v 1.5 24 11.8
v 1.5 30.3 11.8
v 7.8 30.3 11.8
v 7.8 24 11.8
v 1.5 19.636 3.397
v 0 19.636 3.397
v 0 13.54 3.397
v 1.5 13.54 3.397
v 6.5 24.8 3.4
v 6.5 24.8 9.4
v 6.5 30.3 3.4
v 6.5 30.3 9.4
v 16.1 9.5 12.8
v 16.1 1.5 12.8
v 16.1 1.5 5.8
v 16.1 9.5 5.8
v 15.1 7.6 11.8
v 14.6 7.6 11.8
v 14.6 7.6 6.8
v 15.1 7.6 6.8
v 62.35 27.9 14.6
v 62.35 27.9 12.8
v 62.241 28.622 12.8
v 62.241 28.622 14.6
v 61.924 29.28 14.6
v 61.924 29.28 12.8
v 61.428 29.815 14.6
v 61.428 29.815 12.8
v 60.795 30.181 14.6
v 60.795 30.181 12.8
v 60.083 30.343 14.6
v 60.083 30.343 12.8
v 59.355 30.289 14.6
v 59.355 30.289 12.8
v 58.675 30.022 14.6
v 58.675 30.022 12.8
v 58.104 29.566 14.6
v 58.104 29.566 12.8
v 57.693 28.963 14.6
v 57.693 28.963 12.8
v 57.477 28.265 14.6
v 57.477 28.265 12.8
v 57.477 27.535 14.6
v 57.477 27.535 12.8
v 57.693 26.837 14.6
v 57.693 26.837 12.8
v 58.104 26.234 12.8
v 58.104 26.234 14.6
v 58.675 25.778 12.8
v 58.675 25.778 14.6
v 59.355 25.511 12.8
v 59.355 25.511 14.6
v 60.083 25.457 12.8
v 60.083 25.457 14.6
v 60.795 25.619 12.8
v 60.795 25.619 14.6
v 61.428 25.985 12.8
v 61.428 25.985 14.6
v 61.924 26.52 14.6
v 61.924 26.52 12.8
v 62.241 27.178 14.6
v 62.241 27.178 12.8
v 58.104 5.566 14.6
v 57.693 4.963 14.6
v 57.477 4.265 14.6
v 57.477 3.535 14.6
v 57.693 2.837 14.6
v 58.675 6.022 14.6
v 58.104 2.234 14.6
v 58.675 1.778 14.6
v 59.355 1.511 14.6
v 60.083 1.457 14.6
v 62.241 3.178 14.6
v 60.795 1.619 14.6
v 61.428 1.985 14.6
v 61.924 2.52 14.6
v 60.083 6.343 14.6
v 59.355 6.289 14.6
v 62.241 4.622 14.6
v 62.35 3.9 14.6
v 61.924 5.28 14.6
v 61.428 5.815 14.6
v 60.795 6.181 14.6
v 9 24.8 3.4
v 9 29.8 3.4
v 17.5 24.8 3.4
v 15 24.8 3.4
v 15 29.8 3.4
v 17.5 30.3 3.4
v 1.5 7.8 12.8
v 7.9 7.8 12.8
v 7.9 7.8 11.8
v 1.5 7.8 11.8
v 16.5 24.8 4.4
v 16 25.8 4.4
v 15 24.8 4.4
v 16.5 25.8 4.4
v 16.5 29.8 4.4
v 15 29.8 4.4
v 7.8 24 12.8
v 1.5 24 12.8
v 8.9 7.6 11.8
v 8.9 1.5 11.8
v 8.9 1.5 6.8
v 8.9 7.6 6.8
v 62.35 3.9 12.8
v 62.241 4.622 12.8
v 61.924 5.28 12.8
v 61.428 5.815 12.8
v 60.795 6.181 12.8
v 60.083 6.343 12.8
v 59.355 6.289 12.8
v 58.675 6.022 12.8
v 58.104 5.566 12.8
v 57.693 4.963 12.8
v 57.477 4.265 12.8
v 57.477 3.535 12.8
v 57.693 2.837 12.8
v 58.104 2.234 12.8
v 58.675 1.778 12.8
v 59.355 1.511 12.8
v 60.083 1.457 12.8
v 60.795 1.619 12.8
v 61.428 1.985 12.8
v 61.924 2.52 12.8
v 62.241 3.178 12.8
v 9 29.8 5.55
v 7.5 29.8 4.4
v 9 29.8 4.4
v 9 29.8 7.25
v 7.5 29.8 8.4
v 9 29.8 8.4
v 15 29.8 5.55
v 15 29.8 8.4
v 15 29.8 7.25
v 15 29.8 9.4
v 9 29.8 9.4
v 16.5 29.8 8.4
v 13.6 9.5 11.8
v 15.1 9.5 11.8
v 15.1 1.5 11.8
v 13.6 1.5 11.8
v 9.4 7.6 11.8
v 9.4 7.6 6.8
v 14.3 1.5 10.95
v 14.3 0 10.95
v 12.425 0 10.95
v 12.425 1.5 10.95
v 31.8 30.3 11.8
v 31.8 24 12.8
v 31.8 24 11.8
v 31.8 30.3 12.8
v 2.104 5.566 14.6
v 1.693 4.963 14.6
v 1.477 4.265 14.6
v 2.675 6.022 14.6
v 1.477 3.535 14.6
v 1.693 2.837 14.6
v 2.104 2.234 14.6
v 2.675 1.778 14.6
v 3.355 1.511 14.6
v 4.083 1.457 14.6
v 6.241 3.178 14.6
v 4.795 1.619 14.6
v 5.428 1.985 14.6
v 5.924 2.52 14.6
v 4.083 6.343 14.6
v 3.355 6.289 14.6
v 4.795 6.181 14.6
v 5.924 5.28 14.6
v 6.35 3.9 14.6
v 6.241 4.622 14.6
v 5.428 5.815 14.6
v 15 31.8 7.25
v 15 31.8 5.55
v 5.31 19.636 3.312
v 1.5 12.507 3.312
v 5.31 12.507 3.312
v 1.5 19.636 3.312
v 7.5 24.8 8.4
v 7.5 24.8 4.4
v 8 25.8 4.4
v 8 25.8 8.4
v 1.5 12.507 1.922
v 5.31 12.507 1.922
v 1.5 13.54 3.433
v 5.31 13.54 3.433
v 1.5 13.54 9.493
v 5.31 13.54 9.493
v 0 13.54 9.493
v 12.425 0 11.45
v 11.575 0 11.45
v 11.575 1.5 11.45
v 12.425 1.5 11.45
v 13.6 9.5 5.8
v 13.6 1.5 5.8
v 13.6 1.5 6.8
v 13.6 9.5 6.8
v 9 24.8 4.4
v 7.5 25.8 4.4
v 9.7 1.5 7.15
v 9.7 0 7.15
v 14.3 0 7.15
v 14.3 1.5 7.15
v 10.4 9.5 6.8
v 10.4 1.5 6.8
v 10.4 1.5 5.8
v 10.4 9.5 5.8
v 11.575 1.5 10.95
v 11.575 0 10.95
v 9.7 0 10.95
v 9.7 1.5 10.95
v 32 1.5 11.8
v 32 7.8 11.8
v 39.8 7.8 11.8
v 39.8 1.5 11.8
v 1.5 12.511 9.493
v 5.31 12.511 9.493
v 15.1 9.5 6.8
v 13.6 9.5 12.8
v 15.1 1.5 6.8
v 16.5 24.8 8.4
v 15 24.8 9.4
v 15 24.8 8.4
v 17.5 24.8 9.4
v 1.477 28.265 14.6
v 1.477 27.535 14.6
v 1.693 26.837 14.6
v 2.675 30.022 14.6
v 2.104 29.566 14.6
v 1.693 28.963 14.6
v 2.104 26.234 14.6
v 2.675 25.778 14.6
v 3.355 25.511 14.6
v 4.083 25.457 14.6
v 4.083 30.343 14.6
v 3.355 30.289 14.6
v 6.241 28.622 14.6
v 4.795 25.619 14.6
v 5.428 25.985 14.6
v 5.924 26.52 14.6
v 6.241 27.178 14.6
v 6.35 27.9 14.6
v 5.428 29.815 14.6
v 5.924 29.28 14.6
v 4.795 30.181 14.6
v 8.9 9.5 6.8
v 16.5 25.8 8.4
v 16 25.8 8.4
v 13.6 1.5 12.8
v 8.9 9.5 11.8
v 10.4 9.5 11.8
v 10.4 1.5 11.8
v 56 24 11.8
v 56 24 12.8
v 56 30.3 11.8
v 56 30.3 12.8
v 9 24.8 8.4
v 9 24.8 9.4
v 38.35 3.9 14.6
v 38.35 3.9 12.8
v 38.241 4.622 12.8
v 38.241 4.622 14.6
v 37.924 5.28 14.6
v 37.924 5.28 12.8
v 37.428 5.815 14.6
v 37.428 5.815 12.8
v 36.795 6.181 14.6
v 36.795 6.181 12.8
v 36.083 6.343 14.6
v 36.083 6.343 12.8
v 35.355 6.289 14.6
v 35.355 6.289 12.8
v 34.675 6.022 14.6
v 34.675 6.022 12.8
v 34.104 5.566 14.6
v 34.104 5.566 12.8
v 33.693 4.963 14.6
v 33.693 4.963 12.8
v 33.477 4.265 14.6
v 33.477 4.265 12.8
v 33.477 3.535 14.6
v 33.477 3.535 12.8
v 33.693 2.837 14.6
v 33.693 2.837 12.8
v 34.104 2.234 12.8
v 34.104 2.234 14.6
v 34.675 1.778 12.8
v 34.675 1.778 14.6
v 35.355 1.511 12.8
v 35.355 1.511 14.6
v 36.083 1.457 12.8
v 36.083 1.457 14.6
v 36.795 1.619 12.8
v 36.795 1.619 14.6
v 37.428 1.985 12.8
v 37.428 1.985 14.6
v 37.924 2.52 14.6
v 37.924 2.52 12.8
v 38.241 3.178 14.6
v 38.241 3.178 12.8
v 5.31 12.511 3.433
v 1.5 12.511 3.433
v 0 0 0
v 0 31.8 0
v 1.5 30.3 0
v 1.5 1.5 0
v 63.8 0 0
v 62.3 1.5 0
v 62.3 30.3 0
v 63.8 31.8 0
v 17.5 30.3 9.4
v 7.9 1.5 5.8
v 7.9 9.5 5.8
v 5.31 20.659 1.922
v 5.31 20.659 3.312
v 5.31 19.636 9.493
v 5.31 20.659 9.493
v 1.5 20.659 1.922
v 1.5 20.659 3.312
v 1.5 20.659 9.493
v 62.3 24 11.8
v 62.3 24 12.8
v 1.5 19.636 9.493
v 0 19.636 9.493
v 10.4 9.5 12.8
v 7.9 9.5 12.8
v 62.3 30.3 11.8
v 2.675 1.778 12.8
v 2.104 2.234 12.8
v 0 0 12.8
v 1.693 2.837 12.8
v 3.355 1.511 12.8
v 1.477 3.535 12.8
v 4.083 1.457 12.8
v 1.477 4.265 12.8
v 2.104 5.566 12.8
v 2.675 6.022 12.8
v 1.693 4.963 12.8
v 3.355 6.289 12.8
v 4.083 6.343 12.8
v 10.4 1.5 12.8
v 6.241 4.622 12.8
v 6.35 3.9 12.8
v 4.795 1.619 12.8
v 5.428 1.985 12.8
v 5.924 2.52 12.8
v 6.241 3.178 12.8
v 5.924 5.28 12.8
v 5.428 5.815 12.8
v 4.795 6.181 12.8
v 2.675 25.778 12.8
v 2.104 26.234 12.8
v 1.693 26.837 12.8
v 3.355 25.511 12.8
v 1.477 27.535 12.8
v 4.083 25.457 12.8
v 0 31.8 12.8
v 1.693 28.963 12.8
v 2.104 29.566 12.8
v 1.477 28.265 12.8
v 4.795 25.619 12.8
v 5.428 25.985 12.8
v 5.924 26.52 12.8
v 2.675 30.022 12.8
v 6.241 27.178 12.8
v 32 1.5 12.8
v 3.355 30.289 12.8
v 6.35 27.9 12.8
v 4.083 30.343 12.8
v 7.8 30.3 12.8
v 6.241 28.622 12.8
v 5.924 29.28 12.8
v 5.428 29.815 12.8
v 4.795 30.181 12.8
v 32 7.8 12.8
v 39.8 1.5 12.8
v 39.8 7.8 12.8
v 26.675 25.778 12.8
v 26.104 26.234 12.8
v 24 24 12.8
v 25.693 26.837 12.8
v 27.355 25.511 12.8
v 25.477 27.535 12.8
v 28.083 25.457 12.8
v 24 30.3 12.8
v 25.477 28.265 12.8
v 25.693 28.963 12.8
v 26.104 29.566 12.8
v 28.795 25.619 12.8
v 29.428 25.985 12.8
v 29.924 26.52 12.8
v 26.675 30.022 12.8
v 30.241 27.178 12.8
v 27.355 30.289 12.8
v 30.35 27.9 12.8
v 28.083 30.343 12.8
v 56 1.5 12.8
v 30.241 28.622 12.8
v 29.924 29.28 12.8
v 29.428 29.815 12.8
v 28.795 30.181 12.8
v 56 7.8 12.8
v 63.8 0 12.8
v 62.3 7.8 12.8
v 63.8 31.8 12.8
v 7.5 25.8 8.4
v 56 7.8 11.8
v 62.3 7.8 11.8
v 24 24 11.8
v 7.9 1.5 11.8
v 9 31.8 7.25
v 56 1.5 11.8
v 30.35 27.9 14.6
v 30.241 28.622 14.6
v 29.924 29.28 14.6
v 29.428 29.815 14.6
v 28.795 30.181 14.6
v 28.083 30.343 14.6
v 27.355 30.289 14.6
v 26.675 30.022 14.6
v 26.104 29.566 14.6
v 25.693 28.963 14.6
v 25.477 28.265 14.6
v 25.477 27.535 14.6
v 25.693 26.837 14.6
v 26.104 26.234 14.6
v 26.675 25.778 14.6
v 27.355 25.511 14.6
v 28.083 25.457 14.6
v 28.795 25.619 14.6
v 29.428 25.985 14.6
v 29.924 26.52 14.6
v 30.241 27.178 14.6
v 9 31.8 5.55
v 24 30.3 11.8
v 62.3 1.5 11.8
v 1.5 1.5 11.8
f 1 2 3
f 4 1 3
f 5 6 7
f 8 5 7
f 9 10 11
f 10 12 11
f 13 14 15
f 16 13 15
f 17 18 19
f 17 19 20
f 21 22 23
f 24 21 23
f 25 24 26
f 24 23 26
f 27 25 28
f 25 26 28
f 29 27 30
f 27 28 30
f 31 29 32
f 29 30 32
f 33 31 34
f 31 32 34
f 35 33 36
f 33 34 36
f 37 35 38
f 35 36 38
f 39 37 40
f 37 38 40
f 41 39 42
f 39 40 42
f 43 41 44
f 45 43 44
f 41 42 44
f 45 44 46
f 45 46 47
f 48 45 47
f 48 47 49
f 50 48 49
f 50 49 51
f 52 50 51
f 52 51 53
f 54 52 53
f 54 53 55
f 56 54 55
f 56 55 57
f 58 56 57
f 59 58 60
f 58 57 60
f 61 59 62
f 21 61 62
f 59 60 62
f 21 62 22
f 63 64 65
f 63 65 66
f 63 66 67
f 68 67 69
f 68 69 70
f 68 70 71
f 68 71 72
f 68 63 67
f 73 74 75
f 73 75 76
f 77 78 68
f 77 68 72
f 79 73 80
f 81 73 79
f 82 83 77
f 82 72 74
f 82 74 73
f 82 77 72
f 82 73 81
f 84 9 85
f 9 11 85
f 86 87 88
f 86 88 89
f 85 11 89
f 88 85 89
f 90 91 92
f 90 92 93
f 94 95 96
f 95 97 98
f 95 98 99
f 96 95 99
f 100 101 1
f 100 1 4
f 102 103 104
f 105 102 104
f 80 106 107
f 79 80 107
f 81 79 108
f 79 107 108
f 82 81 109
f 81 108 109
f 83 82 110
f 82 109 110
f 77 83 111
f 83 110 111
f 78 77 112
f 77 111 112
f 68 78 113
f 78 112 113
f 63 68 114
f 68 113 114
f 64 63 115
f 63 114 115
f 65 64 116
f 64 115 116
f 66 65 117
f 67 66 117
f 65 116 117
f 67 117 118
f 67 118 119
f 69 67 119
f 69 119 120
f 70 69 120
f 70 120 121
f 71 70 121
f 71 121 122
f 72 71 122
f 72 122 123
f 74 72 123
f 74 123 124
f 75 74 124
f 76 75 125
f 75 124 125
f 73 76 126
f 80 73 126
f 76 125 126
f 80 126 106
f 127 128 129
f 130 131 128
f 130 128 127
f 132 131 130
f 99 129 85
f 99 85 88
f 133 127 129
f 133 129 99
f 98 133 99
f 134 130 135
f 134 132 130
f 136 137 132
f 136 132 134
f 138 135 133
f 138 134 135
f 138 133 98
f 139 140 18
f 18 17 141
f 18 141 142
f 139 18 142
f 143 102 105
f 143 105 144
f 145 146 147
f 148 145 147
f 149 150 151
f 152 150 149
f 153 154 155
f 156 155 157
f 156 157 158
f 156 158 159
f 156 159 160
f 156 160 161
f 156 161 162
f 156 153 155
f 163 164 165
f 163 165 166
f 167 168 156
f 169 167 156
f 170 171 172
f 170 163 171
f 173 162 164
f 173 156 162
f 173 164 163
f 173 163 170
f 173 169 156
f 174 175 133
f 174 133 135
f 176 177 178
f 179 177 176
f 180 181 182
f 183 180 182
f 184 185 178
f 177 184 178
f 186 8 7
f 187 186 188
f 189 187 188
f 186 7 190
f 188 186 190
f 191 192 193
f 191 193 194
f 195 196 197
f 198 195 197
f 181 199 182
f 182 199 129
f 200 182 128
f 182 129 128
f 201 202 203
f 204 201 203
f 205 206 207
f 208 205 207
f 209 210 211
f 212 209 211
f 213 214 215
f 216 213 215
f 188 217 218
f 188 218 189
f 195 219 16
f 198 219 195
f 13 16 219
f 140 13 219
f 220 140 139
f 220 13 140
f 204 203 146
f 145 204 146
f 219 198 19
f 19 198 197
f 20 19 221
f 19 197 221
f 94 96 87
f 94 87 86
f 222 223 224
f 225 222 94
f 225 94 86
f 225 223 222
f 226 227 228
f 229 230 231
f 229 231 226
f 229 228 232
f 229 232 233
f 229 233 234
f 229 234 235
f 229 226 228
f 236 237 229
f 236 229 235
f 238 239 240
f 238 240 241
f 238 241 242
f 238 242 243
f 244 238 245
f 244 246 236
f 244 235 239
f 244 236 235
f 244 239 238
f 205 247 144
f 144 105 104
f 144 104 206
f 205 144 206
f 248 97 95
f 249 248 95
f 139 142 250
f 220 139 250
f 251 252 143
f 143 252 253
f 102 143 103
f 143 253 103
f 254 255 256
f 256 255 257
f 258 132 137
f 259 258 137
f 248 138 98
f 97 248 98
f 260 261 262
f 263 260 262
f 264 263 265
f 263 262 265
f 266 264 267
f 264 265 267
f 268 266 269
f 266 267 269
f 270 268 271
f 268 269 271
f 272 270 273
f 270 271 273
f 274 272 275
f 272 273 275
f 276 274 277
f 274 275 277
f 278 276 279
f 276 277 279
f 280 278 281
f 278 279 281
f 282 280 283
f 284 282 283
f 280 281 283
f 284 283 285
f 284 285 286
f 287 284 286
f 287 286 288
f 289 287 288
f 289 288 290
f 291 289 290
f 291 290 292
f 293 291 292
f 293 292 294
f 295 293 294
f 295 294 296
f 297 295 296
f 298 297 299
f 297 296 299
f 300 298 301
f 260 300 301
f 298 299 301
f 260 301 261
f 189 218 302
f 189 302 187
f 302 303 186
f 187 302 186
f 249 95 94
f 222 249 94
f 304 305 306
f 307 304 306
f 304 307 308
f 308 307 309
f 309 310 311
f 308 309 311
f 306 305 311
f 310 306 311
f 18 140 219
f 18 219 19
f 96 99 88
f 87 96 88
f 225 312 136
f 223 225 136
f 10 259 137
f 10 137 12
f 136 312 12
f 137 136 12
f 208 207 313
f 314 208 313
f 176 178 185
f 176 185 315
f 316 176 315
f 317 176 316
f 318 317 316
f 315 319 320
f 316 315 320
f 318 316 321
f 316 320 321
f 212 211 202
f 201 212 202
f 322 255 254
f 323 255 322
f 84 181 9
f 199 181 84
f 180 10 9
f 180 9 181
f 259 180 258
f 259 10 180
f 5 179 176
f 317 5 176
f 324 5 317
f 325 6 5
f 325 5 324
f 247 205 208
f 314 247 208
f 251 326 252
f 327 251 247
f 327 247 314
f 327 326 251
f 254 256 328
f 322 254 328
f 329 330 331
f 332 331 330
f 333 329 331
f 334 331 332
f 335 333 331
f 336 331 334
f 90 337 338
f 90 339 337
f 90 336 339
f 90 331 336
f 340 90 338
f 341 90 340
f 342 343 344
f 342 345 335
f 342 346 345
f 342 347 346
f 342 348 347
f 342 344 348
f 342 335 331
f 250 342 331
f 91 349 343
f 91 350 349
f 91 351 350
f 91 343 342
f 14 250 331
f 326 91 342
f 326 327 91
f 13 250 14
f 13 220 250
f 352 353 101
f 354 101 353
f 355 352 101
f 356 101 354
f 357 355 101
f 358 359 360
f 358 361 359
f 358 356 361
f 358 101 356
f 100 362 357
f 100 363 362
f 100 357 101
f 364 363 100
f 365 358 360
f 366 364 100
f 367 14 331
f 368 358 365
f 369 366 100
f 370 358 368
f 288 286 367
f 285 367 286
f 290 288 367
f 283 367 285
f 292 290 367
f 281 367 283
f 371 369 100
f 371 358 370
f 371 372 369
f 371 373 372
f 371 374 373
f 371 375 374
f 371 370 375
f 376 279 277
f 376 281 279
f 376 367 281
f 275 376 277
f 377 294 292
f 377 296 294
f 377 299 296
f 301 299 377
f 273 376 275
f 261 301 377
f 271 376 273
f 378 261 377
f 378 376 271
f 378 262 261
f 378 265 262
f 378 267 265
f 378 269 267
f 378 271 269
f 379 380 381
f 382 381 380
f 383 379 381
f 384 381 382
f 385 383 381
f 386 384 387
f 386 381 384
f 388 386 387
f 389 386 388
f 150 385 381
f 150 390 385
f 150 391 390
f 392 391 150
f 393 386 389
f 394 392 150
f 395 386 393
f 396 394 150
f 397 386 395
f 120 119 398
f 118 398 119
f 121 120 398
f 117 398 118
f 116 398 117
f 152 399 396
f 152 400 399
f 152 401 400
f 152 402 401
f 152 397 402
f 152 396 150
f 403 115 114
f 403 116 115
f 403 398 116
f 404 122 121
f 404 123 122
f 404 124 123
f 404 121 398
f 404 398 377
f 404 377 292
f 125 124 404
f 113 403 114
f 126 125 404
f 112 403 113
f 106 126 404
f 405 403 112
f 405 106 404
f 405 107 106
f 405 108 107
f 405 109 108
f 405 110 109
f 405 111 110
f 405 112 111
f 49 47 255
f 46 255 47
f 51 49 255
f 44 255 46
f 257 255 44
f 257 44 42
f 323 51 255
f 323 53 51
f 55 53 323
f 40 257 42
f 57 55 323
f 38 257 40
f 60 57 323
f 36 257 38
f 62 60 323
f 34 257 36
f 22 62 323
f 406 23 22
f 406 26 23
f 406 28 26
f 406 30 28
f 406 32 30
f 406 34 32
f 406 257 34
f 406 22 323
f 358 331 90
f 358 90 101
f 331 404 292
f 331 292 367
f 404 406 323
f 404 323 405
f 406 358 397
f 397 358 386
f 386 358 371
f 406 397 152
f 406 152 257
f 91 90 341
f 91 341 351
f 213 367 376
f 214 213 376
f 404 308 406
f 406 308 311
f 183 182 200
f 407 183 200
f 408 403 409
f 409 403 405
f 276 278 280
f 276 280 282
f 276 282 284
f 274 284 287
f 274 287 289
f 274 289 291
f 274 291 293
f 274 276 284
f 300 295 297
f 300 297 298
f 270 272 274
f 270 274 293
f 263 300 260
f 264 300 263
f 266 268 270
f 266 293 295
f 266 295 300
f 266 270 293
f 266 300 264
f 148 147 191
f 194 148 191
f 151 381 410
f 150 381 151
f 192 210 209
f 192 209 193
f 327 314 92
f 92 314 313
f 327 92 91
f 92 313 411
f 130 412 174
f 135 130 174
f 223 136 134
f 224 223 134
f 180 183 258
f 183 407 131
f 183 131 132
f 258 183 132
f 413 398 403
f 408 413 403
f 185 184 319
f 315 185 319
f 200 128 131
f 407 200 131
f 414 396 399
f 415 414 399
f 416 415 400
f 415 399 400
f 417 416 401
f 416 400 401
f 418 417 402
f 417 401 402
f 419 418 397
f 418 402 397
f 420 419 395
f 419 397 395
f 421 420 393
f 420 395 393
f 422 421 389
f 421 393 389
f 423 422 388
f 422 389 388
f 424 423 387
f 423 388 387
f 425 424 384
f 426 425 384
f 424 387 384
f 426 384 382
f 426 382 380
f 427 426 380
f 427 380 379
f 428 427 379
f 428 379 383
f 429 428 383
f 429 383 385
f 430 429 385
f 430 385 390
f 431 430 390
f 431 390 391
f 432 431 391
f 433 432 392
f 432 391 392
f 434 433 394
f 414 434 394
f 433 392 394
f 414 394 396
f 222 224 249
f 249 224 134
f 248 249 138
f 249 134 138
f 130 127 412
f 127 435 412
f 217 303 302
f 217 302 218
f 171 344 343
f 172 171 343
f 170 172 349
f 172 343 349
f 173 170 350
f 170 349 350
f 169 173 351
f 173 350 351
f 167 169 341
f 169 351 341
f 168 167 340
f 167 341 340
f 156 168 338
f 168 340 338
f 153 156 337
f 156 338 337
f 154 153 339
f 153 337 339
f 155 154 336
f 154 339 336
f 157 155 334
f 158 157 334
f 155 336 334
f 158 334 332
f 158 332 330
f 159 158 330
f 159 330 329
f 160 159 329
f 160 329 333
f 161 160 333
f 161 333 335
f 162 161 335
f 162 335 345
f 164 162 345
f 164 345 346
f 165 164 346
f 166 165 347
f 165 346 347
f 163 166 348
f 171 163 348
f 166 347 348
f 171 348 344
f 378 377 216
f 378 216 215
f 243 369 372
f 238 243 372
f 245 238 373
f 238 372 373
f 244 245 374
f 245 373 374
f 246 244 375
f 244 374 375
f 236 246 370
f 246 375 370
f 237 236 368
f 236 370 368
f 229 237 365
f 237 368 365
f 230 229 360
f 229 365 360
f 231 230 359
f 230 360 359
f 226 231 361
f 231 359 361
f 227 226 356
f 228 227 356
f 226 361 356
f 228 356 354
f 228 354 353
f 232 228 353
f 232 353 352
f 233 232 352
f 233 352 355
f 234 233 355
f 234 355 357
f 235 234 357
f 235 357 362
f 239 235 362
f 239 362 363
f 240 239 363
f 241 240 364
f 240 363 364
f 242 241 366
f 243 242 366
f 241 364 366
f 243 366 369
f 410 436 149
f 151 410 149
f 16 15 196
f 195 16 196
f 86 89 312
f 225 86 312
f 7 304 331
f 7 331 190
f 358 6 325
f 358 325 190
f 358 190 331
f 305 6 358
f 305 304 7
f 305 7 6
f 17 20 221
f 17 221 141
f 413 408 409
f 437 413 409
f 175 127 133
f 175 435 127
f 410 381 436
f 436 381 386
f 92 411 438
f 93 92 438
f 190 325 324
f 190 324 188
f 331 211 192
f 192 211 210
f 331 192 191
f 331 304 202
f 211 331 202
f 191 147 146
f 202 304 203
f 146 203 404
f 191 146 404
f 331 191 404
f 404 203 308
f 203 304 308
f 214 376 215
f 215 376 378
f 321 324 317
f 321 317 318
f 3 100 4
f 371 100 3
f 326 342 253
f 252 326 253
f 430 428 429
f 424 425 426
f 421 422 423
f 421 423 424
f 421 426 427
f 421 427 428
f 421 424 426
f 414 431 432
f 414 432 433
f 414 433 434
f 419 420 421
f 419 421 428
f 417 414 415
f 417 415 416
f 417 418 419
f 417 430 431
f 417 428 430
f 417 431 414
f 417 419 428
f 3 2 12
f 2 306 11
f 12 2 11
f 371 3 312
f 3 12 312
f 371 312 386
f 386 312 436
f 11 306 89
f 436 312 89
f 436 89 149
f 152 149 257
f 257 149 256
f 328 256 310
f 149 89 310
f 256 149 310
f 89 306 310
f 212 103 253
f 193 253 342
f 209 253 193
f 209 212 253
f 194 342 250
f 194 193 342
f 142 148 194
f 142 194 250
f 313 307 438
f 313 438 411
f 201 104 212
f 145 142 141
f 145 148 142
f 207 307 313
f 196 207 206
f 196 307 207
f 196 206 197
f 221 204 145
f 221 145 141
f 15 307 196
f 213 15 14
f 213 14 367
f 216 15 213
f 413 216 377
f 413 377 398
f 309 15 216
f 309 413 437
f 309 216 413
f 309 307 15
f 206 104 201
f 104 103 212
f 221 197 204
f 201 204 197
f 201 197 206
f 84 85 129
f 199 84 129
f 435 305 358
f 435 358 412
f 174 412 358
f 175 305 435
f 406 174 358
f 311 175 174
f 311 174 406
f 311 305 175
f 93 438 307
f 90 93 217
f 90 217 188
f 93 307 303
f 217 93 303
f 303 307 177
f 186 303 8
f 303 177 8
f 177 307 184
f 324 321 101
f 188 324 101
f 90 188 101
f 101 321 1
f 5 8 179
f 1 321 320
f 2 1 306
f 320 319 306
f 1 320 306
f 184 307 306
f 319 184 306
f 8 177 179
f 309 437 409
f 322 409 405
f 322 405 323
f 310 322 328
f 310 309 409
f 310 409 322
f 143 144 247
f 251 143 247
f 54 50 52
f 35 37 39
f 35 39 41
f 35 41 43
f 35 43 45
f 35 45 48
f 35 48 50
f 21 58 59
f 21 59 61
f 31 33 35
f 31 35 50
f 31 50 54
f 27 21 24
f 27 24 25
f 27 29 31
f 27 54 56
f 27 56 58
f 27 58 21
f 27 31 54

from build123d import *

# Parameters (mm, degrees)
F0_W      = 63.8
F0_H      = 31.8
F0_W_2    = 60.8
F0_H_2    = 28.8
F1_DEPTH  = 12.8
F2_W      = 6.3
F2_H      = 6.3
F2_W_2    = 7.8
F3_DEPTH  = 1
F4_R      = 2.45
F5_DEPTH  = 1.8
F6_W      = 0.85
F6_H      = 0.5
F7_DEPTH  = 25.4
F9_DEPTH  = 8
F11_DEPTH = 5
F12_W     = 0.1
F12_H     = 1
F13_DEPTH = 6.3
F14_W     = 6
F14_H     = 1.7
F15_DEPTH = 2.54
F16_W     = 11
F16_H     = 6
F16_W_2   = 6
F16_H_2   = 1.7
F17_DEPTH = 0.5
F19_DEPTH = 5
F21_DEPTH = 4
F22_W     = 6.096
F22_H     = 6.096
F23_DEPTH = 25.4
F24_W     = 1.0284033013
F24_H     = 6.0595651898
F25_DEPTH = 3.81
F26_W     = 1.0230291676
F26_H     = 6.1809321209
F27_DEPTH = 3.81
F28_W     = 8.1515833735
F28_H     = 1.3899055775
F29_DEPTH = 3.81


# Not quite as in the source:
# - a feature names something its author has since deleted; it is built from what else it names


with BuildPart() as f1:
    # F0 (on Top) → F1 (new body)
    with BuildSketch(Plane.XY):
        with Locations((31.9, 15.9)):
            Rectangle(F0_W, F0_H)
        with Locations((31.9, 15.9)):
            Rectangle(F0_W_2, F0_H_2, mode=Mode.SUBTRACT)
    extrude(amount=F1_DEPTH)

    # F2 (on face) → F3 (join)
    with BuildSketch(Plane.XY.offset(12.8)):
        with Locations((4.65, 27.15)):
            Rectangle(F2_W, F2_H)
        with Locations((4.65, 4.65)):
            Rectangle(F2_W, F2_H)
        with Locations((59.15, 4.65)):
            Rectangle(F2_W, F2_H)
        with Locations((59.15, 27.15)):
            Rectangle(F2_W, F2_H)
        with Locations((27.9, 27.15)):
            Rectangle(F2_W_2, F2_H)
        with Locations((35.9, 4.65)):
            Rectangle(F2_W_2, F2_H)
    extrude(amount=-F3_DEPTH)

    # F4 (on face) → F5 (join)
    with BuildSketch(Plane.XY.offset(12.8)):
        with Locations((3.9, 27.9)):
            Circle(F4_R)
        with Locations((59.9, 27.9)):
            Circle(F4_R)
        with Locations((59.9, 3.9)):
            Circle(F4_R)
        with Locations((3.9, 3.9)):
            Circle(F4_R)
        with Locations((27.9, 27.9)):
            Circle(F4_R)
        with Locations((35.9, 3.9)):
            Circle(F4_R)
    extrude(amount=F5_DEPTH)

    # F6 (on face) → F7 (cut)
    with BuildSketch(Plane.XZ):
        Polygon((11.575, 10.95), (9.7, 10.95), (9.7, 7.15), (14.3, 7.15), (14.3, 10.95), (12.425, 10.95), align=None)
        with Locations((12, 11.2)):
            Rectangle(F6_W, F6_H)
    extrude(amount=-F7_DEPTH, mode=Mode.SUBTRACT)

    # F8 (on face) → F9 (join)
    with BuildSketch(Plane(origin=(0, 1.5, 0), x_dir=(-1, 0, 0), z_dir=(0, 1, 0))):
        Polygon((-13.6, 5.8), (-13.6, 6.8), (-15.1, 6.8), (-15.1, 11.8), (-13.6, 11.8), (-13.6, 12.8), (-16.1, 12.8), (-16.1, 5.8), align=None)
        Polygon((-8.9, 6.8), (-10.4, 6.8), (-10.4, 5.8), (-7.9, 5.8), (-7.9, 12.8), (-10.4, 12.8), (-10.4, 11.8), (-8.9, 11.8), align=None)
    extrude(amount=F9_DEPTH)

    # F10 (on face) → F11 (join, through all)
    with BuildSketch(Plane.XY.offset(6.8)):
        Polygon((14.6, 7.6), (15.1, 7.6), (15.1, 9.5), align=None)
        Polygon((9.4, 7.6), (8.9, 9.5), (8.9, 7.6), align=None)
    extrude(amount=F11_DEPTH)

    # F12 (on face) → F13 (join, through all)
    with BuildSketch(Plane(origin=(0, 1.5, 0), x_dir=(-1, 0, 0), z_dir=(0, 1, 0))):
        with Locations((-7.85, 12.3)):
            Rectangle(F12_W, F12_H)
    extrude(amount=F13_DEPTH)

    # F14 (on face) → F15 (cut)
    with BuildSketch(Plane(origin=(0, 31.8, 0), x_dir=(-1, 0, 0), z_dir=(0, 1, 0))):
        with Locations((-12, 6.4)):
            Rectangle(F14_W, F14_H)
    extrude(amount=-F15_DEPTH, mode=Mode.SUBTRACT)

    # F16 (on face) → F17 (join)
    with BuildSketch(Plane.XZ.offset(-30.3)):
        with Locations((12, 6.4)):
            Rectangle(F16_W, F16_H)
        with Locations((12, 6.4)):
            Rectangle(F16_W_2, F16_H_2, mode=Mode.SUBTRACT)
    extrude(amount=F17_DEPTH)

    # F18 (on face) → F19 (join)
    with BuildSketch(Plane.XZ.offset(-29.8)):
        Polygon((9, 9.4), (6.5, 9.4), (6.5, 3.4), (9, 3.4), (9, 4.4), (7.5, 4.4), (7.5, 8.4), (9, 8.4), align=None)
        Polygon((17.5, 9.4), (15, 9.4), (15, 8.4), (16.5, 8.4), (16.5, 4.4), (15, 4.4), (15, 3.4), (17.5, 3.4), align=None)
    extrude(amount=F19_DEPTH)

    # F20 (on face) → F21 (join, through all)
    with BuildSketch(Plane.XY.offset(4.4)):
        Polygon((7.5, 25.8), (7.5, 24.8), (8, 25.8), align=None)
        Polygon((16, 25.8), (16.5, 24.8), (16.5, 25.8), align=None)
    extrude(amount=F21_DEPTH)

    # F22 (on face) → F23 (cut)
    with BuildSketch(Plane(origin=(0, 0, 0), x_dir=(0, -1, 0), z_dir=(-1, 0, 0))):
        with Locations((-16.5878270902, 6.4446975011)):
            Rectangle(F22_W, F22_H)
    extrude(amount=-F23_DEPTH, mode=Mode.SUBTRACT)

    # F24 (on face) → F25 (join)
    with BuildSketch(Plane.YZ.offset(1.5)):
        with Locations((13.0256254396, 6.4629149062)):
            Rectangle(F24_W, F24_H)
    extrude(amount=F25_DEPTH)

    # F26 (on face) → F27 (join)
    with BuildSketch(Plane.YZ.offset(1.5)):
        with Locations((20.147341674, 6.4022314407)):
            Rectangle(F26_W, F26_H)
    extrude(amount=F27_DEPTH)

    # F28 (on face) → F29 (join)
    with BuildSketch(Plane.YZ.offset(1.5)):
        with Locations((16.583064571, 2.6168125914)):
            Rectangle(F28_W, F28_H)
    extrude(amount=F29_DEPTH)


solid = f1.part
